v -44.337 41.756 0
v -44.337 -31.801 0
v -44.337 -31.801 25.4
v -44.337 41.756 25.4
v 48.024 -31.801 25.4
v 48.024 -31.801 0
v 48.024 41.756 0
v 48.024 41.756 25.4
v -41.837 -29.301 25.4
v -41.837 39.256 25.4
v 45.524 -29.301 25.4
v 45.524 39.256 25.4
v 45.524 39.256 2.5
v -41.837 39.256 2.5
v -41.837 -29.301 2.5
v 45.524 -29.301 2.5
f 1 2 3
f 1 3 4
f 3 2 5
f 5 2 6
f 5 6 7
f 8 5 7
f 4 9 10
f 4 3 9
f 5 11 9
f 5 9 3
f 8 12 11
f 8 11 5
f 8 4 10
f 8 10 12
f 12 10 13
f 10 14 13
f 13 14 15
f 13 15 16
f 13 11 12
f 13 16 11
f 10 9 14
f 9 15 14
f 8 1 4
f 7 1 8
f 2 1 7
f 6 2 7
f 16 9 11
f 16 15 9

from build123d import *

# Parameters (mm, degrees)
F0_W      = 92.3617742956
F0_H      = 73.5575780272
F1_DEPTH  = 25.4
F2_DEPTH  = 25
F3_T      = -2.5
F3_FACE_W = 87.3617742956
F3_FACE_H = 68.5575780272


with BuildPart() as f1:
    # F0 (on Top) → F1 (new body)
    with BuildSketch(Plane.XY):
        with Locations((1.8435474485, 4.9775801599)):
            Rectangle(F0_W, F0_H)
    extrude(amount=F1_DEPTH)

    # F0 (on Top) → F2 (join)
    with BuildSketch(Plane.XY):
        with Locations((1.8435474485, 4.9775801599)):
            Rectangle(F0_W, F0_H)
    extrude(amount=F2_DEPTH)

    # F3
    f3_openings = [f1.faces().sort_by_distance(p)[0] for p in [
        (1.843547, 4.97758, 25.4),
    ]]
    offset(amount=F3_T, openings=f3_openings)

    # F3_face (on face) → F4 section 0
    with BuildSketch(Plane(origin=(1.8435474485, 4.9775801599, 2.5), x_dir=(1, 0, 0), z_dir=(0, 0, 1)), mode=Mode.PRIVATE) as f4_s0:
        Rectangle(F3_FACE_W, F3_FACE_H)
    loft([f4_s0.sketch, Vertex(0, 0, 0)])


solid = f1.part
